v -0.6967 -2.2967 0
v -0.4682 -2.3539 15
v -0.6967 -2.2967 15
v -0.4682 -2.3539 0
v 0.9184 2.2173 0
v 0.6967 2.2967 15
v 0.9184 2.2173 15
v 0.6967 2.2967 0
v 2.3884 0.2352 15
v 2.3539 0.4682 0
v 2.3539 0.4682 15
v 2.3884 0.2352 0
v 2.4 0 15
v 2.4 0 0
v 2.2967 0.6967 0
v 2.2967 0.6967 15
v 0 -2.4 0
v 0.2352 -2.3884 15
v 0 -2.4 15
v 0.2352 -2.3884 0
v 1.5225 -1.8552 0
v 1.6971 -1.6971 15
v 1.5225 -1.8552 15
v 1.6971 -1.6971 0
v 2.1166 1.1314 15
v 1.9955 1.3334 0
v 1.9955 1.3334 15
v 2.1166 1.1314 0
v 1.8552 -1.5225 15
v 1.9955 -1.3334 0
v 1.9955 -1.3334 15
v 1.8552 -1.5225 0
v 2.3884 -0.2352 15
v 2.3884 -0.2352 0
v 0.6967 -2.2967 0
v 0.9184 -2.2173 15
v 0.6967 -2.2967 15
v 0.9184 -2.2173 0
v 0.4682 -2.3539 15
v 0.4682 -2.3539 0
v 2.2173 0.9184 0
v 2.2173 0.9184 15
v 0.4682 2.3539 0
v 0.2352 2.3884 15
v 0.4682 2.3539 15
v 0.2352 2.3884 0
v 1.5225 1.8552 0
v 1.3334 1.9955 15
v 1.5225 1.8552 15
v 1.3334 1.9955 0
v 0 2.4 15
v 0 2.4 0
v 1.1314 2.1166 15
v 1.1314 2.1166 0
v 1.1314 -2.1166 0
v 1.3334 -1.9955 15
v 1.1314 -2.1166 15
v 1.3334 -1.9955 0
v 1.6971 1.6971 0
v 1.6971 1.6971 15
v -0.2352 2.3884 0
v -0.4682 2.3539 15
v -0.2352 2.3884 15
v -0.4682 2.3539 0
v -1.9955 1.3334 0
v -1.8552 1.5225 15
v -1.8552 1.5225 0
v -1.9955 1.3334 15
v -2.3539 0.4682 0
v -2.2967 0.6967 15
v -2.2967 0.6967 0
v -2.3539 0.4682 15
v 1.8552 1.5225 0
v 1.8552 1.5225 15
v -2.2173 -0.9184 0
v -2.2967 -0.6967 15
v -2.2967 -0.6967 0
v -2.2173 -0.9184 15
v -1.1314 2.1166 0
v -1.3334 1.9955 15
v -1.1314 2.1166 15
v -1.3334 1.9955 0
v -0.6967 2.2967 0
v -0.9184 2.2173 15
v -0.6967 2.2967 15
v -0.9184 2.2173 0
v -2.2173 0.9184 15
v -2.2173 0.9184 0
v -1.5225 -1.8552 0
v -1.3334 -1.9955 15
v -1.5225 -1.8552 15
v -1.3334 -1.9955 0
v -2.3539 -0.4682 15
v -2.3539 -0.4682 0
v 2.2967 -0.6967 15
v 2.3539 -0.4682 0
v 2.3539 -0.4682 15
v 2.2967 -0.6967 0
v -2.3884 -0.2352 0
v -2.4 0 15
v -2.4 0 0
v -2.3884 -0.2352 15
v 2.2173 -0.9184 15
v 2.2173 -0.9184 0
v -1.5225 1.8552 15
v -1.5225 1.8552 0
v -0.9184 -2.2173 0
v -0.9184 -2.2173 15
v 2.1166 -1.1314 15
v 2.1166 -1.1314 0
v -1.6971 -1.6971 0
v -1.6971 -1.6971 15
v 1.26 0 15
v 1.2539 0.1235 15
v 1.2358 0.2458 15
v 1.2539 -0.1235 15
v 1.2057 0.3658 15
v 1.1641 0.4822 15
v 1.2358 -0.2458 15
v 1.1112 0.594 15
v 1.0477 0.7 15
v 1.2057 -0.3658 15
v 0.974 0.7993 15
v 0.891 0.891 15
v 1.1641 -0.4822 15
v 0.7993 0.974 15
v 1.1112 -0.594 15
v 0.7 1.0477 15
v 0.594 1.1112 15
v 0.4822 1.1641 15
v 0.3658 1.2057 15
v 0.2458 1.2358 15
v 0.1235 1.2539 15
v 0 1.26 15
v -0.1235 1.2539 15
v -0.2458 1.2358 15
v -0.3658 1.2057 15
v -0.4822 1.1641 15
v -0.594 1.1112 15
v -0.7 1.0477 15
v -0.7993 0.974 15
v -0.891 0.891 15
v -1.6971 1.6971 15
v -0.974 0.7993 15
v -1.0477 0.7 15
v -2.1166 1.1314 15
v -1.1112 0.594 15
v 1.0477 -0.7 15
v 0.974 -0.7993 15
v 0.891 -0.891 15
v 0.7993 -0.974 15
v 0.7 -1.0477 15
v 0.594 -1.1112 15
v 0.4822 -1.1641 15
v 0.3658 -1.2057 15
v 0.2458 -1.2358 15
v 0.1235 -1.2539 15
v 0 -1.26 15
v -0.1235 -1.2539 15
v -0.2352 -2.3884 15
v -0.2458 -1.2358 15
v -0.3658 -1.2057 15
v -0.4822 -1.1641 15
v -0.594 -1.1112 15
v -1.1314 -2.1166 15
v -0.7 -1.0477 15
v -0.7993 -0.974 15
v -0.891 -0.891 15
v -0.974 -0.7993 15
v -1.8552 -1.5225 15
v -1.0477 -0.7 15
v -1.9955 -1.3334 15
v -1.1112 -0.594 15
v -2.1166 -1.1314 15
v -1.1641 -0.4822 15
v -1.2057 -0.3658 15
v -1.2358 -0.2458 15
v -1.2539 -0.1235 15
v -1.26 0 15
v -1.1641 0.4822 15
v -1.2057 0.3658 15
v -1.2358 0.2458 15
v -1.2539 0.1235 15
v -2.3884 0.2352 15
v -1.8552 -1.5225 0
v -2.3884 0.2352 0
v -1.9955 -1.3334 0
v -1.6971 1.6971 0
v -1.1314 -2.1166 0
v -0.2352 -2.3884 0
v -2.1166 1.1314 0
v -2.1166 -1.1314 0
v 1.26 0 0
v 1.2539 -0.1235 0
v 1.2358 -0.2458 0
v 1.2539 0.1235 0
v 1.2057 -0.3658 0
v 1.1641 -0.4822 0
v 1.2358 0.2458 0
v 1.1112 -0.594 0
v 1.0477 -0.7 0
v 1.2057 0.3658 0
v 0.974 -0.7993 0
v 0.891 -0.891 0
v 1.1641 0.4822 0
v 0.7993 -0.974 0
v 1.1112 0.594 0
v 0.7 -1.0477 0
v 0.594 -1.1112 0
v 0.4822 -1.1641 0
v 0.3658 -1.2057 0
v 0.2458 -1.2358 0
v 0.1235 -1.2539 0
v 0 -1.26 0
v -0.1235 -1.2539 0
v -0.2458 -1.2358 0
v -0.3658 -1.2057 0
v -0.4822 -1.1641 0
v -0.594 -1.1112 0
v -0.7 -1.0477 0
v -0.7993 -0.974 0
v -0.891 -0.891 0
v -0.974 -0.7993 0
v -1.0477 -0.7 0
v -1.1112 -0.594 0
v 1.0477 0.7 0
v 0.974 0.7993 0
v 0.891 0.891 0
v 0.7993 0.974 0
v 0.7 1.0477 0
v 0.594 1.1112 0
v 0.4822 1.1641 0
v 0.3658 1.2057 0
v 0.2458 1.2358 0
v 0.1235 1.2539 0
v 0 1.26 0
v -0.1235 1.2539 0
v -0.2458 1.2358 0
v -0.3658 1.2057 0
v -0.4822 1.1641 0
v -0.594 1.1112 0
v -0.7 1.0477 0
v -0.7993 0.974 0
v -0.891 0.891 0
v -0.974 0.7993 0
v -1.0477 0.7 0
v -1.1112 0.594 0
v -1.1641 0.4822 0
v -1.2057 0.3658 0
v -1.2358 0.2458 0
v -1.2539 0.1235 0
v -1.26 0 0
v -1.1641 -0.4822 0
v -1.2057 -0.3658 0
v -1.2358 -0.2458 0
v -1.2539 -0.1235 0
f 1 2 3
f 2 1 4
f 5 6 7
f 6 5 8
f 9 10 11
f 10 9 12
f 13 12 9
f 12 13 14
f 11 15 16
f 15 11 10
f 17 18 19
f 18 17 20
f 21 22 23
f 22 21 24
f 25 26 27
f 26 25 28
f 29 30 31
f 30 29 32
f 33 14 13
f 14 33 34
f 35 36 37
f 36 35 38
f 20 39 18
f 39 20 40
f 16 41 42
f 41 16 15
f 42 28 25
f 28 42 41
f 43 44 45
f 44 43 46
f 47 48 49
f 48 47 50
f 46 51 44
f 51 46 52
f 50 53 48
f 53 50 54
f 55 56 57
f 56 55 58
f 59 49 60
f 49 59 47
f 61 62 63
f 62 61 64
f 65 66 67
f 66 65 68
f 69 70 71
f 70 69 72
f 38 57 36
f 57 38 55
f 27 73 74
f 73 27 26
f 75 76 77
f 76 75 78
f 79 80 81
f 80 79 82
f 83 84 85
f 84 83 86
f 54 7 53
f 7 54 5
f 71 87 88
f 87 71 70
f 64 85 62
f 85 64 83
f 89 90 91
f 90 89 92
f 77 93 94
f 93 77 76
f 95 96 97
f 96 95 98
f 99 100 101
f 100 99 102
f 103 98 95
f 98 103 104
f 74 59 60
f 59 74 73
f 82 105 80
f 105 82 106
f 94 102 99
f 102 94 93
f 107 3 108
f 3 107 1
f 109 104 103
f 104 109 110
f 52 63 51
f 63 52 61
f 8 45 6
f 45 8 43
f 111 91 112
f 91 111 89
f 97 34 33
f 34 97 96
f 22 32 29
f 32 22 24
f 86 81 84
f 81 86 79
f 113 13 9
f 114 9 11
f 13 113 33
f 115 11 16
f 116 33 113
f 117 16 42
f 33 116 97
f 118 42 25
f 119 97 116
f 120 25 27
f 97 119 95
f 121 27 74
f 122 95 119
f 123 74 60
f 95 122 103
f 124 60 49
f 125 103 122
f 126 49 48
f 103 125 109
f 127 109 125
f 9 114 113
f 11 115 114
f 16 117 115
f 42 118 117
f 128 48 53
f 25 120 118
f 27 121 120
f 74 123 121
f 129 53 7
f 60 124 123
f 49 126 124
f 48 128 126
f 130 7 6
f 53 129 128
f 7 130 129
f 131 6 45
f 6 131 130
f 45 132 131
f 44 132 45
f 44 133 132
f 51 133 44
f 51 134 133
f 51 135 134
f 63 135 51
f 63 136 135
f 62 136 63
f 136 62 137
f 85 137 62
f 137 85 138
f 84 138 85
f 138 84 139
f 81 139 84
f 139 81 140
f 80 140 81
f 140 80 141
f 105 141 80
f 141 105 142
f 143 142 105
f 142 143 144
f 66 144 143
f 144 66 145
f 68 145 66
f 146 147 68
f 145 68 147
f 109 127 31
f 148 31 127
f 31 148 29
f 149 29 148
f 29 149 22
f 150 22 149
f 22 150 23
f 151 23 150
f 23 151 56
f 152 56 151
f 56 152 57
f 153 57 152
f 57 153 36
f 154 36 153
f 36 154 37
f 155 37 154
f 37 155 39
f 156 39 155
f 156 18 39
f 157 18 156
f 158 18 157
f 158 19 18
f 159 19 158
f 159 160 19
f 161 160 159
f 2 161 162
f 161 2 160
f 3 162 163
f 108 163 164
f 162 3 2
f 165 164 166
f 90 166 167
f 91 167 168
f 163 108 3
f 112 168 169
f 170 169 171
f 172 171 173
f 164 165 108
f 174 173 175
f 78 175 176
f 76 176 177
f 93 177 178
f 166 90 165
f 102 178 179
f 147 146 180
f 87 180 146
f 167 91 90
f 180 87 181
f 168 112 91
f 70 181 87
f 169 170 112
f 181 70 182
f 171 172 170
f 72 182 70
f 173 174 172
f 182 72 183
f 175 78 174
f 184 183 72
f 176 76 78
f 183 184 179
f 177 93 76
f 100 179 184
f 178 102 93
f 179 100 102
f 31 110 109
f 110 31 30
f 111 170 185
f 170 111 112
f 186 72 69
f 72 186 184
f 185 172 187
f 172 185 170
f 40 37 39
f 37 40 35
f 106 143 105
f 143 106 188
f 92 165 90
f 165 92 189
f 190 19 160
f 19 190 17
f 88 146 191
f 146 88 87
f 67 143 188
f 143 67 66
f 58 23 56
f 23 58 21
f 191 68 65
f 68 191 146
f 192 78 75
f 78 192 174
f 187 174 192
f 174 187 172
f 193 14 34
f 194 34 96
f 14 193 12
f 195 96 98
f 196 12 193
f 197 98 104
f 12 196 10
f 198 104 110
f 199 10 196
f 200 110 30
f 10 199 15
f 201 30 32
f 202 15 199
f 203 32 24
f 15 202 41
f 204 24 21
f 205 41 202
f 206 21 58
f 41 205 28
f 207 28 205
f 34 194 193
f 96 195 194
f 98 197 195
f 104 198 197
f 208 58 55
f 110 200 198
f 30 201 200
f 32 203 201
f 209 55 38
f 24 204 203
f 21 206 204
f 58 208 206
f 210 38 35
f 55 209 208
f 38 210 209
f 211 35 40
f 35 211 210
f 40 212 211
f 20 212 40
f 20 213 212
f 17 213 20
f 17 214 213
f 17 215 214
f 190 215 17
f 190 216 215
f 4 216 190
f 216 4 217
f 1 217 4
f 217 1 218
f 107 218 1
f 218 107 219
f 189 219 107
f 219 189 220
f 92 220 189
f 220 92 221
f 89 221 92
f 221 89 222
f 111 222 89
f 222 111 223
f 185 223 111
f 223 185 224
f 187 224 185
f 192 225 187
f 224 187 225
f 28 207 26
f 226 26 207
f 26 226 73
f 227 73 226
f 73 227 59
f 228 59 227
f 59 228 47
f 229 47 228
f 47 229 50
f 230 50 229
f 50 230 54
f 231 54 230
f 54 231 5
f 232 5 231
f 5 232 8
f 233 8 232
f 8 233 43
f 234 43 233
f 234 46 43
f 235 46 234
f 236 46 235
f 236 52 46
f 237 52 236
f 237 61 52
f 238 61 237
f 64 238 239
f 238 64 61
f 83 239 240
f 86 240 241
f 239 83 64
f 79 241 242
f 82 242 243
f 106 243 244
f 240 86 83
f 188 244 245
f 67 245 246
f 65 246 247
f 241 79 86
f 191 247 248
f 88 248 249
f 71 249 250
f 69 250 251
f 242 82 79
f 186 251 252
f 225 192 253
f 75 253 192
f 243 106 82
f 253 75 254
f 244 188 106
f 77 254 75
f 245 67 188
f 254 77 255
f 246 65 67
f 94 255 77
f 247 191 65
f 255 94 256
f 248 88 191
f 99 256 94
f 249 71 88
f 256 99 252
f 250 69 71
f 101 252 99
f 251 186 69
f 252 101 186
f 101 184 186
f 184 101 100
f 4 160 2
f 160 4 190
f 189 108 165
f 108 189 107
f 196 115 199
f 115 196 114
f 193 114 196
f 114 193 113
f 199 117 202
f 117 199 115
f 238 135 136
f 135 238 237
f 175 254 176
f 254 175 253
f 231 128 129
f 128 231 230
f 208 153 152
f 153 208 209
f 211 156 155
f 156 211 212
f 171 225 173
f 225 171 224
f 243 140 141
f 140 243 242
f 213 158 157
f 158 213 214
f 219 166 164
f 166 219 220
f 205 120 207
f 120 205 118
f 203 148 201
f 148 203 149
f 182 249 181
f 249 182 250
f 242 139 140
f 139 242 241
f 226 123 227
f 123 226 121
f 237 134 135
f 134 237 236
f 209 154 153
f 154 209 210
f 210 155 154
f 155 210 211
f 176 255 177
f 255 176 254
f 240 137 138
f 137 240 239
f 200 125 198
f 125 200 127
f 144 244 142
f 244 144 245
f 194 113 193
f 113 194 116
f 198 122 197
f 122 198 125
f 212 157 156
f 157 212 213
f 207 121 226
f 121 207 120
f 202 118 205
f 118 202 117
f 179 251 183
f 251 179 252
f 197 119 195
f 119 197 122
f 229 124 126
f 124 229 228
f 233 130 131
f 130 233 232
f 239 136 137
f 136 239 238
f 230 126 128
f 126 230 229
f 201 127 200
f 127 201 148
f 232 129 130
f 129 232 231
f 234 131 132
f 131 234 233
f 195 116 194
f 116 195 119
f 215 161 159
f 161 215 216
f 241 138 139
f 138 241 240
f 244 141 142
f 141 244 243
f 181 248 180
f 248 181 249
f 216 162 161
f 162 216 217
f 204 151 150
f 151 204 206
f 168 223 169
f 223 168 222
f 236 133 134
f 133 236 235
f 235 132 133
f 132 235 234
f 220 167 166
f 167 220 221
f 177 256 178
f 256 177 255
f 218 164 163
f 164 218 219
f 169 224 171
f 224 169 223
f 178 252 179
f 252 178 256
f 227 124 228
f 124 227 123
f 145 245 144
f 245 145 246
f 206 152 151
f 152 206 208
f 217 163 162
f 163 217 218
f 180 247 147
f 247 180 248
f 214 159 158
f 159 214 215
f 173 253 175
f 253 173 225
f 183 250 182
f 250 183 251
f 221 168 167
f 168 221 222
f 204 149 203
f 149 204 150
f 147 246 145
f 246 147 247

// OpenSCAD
difference() {
    cylinder(r=2.4, h=15, $fn=64);
    cylinder(r=1.26, h=15, $fn=64);
}
